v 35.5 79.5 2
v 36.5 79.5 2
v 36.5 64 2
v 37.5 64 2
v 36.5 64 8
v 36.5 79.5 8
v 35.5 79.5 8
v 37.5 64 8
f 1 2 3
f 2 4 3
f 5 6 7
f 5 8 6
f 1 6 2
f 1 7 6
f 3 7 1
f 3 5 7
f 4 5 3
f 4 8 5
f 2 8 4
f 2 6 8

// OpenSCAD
//cube([9,3,3]);

linear_extrude(height = 9)
import("_coffe1.dxf");

translate([30,64,3])
linear_extrude(height = 4)
import("_coffe2.dxf");

translate([36.5,64,2])
linear_extrude(height = 6)
polygon(points=[
	[0,0],[-1,15.5],[0,15.5],[1,0]//[50,64],
/*
  [60,80],//,[40,0]
	[50,-40],//[5,-8],
	[50,-80],[40,-80],
	[40,-40],[30,-10],
  [20,0]*/
]
);
